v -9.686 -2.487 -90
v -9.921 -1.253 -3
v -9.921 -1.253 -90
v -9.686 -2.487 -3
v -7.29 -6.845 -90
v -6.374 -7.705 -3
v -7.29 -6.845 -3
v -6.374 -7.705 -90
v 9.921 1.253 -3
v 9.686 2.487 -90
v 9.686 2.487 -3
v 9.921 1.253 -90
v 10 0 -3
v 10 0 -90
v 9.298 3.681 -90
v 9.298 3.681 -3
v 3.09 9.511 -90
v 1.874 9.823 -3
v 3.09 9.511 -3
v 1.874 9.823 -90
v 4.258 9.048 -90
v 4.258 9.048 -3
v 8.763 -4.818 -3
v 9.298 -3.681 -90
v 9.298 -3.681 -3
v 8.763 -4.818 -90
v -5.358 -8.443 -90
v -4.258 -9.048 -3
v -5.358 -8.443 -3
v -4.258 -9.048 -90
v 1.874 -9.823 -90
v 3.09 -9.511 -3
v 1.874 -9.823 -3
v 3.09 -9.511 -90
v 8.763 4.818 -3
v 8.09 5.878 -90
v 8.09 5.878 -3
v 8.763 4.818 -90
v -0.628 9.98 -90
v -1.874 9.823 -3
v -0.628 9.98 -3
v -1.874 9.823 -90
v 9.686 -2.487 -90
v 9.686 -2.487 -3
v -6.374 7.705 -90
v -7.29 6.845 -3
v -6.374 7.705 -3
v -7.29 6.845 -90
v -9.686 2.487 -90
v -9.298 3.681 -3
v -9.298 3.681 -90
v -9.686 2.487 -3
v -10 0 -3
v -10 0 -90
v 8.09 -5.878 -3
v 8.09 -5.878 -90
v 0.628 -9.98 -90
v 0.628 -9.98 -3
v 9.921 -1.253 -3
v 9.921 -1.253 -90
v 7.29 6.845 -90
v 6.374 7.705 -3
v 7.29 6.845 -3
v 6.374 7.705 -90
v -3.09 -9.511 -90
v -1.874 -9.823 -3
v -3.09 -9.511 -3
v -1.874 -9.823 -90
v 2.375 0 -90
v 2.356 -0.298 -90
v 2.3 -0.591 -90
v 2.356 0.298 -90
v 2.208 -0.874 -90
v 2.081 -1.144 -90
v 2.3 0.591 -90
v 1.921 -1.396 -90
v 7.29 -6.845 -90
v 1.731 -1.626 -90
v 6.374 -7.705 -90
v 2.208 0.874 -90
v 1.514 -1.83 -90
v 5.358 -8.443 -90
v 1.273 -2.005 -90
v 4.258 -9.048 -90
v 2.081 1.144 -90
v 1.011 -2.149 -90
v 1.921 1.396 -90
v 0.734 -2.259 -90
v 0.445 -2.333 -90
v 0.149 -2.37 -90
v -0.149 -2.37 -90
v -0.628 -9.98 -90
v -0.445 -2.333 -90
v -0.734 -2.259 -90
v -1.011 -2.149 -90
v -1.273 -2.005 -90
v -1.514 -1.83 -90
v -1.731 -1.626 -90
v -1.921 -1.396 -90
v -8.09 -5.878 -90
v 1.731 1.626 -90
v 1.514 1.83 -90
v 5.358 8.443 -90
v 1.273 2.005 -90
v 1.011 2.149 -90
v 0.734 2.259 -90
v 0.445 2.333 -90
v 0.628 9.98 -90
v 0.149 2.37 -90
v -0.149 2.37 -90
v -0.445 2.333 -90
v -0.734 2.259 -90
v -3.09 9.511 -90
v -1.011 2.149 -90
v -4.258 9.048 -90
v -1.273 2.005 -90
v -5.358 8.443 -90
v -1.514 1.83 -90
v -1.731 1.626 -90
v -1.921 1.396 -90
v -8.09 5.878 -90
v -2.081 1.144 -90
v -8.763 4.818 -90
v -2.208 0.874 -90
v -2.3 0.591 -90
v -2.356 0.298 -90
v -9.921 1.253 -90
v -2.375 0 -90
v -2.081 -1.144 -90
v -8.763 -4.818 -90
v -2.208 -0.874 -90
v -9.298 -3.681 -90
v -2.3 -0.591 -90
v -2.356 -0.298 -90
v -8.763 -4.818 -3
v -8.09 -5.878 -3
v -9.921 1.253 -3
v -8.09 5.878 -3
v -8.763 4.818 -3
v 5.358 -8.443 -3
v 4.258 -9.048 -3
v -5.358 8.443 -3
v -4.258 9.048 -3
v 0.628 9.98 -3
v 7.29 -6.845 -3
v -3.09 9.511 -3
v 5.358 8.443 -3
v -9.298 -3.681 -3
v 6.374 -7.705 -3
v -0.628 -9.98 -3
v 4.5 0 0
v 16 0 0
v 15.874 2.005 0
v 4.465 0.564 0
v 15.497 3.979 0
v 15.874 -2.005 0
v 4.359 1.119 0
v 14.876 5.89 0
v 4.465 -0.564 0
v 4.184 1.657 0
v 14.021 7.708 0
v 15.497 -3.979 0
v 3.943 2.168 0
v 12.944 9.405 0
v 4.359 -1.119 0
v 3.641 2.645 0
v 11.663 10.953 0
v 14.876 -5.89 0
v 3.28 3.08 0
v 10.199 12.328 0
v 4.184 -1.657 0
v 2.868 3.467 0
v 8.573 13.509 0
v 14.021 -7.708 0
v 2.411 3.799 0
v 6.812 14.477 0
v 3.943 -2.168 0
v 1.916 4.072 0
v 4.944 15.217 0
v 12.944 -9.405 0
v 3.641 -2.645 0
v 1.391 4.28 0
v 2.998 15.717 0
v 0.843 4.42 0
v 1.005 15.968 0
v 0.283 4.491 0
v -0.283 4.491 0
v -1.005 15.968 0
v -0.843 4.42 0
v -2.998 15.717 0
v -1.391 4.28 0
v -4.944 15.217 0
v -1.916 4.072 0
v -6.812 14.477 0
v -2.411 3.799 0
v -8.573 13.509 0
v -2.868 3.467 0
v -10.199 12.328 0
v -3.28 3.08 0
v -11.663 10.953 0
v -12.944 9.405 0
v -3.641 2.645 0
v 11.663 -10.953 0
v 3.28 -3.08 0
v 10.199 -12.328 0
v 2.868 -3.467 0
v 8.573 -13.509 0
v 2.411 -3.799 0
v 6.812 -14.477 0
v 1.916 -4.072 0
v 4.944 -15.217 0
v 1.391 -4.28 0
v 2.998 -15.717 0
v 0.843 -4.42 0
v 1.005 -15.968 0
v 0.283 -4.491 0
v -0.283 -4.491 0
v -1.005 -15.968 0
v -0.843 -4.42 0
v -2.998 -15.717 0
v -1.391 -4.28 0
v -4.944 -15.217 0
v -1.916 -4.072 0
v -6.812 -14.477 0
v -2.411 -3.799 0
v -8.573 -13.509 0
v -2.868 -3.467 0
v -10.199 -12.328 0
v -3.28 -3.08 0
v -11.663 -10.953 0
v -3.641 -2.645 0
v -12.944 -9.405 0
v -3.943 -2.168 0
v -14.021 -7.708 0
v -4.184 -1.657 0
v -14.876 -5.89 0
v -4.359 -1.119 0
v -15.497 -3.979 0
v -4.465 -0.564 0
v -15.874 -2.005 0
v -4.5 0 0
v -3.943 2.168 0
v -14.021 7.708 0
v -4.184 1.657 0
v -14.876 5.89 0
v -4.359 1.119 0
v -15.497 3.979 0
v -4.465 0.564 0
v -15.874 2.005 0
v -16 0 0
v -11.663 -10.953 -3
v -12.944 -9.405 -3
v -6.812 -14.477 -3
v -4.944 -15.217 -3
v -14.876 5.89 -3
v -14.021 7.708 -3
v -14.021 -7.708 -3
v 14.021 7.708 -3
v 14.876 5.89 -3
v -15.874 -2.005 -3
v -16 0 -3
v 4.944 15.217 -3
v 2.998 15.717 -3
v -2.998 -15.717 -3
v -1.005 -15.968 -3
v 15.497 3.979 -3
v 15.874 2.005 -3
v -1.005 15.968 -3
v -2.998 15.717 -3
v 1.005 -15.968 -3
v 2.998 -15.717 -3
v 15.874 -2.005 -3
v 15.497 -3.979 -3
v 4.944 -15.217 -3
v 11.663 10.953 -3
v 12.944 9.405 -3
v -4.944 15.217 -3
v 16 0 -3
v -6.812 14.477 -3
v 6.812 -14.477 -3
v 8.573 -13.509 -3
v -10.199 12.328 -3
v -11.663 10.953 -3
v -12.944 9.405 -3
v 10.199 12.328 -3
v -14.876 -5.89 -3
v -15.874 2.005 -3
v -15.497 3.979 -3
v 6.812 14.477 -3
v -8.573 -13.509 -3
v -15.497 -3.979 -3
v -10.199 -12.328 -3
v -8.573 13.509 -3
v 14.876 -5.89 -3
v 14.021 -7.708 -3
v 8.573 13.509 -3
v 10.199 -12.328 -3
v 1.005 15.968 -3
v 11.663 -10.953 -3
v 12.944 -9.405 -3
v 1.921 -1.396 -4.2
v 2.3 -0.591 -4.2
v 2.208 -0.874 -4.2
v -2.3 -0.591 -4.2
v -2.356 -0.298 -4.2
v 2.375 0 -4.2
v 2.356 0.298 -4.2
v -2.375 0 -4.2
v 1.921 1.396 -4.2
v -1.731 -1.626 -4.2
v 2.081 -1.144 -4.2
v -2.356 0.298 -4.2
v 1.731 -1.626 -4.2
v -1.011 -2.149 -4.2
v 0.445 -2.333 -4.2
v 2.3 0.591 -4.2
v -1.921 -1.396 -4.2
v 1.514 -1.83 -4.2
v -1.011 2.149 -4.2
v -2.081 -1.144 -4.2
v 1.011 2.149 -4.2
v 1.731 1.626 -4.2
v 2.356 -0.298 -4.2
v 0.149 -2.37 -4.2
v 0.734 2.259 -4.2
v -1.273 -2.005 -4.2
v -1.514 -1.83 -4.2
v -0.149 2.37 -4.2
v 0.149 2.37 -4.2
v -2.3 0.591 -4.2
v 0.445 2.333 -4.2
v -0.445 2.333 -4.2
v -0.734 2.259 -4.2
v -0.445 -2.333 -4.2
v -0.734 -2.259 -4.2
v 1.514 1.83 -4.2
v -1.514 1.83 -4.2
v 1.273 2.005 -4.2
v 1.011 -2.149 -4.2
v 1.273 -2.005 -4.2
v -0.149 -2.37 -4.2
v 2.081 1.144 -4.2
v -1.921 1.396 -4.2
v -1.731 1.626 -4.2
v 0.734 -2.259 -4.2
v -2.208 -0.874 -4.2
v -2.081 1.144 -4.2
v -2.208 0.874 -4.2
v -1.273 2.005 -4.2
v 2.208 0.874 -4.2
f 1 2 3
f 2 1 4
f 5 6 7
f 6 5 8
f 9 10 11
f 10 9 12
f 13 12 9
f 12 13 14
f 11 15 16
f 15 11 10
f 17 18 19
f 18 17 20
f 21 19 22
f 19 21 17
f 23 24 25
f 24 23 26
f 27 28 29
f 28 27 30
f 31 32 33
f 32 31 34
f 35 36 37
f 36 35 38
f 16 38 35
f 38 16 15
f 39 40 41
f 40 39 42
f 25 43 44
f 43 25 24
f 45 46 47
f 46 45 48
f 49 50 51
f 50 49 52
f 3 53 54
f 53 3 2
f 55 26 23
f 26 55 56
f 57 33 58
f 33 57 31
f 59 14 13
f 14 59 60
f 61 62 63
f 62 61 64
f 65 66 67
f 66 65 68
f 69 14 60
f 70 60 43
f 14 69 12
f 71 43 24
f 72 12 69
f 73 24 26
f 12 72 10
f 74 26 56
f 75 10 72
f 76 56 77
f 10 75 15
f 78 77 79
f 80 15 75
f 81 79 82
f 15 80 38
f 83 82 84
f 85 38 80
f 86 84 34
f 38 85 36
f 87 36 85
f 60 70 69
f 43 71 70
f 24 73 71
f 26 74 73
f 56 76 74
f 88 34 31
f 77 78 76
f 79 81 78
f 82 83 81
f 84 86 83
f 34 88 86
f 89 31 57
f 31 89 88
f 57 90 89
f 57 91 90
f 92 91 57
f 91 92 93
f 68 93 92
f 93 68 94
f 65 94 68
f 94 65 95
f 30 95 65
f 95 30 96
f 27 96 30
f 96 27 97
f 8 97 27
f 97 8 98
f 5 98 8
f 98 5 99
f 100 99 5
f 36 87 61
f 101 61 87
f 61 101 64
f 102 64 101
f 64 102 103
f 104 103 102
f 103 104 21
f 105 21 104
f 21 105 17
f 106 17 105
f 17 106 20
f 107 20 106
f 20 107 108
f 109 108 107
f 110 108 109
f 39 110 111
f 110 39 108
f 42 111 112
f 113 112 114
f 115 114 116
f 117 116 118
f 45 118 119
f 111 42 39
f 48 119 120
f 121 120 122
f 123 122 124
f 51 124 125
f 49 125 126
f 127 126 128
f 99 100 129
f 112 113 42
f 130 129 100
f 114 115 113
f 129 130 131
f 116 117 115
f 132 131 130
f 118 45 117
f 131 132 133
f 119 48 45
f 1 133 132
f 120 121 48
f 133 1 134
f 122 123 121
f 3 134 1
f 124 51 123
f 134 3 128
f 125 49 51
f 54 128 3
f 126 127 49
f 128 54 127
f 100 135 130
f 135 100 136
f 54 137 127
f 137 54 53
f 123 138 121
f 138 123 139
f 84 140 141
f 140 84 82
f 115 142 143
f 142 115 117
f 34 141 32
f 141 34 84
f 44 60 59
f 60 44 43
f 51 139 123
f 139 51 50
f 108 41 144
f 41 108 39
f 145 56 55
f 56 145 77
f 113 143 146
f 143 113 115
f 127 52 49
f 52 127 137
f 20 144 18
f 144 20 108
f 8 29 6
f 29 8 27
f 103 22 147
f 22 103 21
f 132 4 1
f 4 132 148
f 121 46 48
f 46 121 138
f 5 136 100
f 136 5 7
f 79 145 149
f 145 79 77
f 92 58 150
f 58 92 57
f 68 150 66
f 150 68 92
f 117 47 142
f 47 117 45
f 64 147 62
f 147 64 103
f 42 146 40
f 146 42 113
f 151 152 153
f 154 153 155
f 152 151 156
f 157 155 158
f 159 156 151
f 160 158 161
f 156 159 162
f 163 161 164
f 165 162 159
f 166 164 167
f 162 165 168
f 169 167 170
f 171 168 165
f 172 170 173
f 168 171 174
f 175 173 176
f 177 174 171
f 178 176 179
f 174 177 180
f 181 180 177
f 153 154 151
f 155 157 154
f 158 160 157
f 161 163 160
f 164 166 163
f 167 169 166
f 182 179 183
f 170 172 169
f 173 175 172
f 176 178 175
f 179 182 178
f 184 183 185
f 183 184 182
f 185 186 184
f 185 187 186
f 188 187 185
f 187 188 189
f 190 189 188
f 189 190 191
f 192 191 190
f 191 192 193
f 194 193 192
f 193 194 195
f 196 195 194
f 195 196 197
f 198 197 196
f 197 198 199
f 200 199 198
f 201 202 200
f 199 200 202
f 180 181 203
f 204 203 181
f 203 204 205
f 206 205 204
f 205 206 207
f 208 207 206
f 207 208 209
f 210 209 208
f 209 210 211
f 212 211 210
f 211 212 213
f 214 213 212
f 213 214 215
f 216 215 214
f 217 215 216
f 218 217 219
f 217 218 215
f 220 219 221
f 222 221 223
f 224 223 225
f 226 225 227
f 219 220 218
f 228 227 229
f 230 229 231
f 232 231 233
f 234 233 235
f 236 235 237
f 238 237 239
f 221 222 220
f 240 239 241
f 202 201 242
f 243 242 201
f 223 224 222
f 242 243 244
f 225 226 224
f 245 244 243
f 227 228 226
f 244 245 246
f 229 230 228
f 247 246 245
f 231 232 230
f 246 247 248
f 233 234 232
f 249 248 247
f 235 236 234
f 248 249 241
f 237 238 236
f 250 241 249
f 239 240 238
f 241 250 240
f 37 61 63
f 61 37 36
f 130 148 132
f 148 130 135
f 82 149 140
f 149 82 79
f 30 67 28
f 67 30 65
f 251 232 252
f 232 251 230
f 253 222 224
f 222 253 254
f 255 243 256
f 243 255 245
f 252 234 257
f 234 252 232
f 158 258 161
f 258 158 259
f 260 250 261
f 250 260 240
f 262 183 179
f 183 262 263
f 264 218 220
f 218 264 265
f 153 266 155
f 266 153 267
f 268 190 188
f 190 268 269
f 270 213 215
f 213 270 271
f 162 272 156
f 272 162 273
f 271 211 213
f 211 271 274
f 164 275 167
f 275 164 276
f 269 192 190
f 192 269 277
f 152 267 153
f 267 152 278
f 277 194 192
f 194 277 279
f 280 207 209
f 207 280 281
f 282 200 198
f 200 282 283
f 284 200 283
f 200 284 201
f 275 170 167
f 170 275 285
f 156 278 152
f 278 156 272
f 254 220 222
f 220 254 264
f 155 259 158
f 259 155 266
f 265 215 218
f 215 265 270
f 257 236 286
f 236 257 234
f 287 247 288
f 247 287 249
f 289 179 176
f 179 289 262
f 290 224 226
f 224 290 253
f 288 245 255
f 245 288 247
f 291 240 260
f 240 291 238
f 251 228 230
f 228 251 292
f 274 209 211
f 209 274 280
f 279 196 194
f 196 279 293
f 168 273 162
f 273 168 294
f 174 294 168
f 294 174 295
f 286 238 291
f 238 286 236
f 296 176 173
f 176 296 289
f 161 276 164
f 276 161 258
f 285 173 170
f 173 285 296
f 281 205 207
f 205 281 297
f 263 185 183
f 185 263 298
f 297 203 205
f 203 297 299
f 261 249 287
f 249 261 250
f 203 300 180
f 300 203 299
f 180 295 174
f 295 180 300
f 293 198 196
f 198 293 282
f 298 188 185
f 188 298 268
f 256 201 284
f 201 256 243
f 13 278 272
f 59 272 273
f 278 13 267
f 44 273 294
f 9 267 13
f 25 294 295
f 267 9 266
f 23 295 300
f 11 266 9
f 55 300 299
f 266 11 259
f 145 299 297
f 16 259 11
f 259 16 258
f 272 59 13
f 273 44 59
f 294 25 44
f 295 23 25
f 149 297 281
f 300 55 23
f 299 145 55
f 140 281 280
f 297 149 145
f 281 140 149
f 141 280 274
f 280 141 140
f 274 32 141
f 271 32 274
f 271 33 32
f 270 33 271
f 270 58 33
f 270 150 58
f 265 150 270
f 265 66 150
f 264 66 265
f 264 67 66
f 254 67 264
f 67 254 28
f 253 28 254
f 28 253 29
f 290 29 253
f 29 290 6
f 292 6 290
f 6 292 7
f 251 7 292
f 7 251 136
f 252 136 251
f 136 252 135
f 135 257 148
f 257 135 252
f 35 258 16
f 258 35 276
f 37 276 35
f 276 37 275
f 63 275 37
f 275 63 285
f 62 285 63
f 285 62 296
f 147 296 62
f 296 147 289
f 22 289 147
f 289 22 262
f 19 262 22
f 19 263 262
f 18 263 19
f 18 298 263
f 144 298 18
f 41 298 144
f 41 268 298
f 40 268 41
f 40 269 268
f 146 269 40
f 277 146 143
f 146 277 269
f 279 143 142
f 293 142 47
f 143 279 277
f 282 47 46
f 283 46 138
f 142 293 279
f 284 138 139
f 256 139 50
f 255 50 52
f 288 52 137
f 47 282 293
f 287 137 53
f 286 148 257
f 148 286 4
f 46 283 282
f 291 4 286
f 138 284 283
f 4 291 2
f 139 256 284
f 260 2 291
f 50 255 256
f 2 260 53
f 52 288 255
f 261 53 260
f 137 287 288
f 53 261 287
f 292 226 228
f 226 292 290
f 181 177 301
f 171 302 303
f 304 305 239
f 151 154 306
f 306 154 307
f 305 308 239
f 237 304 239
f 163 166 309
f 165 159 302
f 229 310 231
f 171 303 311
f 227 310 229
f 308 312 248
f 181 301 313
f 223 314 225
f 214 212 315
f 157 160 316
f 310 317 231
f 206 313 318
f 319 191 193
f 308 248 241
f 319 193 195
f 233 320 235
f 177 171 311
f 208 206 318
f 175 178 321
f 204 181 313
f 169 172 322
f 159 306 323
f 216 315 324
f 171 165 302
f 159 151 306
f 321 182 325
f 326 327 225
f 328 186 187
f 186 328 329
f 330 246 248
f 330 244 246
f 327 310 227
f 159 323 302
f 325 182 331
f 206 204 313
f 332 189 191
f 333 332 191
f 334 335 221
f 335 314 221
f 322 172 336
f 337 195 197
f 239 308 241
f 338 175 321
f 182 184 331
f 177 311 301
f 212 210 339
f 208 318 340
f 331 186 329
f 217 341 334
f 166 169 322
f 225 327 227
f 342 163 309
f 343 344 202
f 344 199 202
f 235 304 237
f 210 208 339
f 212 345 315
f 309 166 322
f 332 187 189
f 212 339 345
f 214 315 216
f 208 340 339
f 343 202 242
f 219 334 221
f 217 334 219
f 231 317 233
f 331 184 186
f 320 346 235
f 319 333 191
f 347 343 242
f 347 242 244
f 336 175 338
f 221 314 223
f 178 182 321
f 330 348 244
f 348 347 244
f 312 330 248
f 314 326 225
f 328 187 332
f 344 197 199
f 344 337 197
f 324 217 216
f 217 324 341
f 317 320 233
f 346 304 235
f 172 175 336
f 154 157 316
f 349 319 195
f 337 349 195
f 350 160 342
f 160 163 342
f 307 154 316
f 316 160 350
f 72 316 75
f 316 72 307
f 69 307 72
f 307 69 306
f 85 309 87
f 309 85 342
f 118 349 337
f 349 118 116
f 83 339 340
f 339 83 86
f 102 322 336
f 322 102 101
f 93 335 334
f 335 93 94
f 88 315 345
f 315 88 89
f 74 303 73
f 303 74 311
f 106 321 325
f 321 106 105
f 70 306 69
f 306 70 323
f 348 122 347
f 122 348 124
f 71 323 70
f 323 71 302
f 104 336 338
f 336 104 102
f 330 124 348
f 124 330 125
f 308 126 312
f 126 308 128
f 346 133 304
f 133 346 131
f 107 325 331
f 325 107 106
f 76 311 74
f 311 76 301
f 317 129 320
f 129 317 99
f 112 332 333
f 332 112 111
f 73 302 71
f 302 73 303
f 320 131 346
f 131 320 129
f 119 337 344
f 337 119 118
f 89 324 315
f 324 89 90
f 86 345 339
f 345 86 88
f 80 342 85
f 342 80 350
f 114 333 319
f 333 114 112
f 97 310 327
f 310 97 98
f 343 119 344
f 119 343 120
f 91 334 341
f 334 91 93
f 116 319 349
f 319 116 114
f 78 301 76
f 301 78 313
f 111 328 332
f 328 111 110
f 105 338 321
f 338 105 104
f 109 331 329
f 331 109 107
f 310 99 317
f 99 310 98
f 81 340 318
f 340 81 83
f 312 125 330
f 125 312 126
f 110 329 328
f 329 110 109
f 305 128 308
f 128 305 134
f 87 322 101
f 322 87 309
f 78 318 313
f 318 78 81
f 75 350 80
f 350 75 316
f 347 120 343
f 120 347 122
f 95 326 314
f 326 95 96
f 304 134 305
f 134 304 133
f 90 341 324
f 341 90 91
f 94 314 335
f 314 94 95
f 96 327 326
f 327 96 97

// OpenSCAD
$fn = 50;


difference() {
	union() {
		translate(v = [0, 0, -90.0000000000]) {
			cylinder(h = 90, r = 10.0000000000);
		}
		translate(v = [0, 0, -3.0000000000]) {
			cylinder(h = 3, r = 16.0000000000);
		}
	}
	union() {
		translate(v = [0, 0, 0]) {
			rotate(a = [0, 0, 0]) {
				difference() {
					union() {
						#translate(v = [0, 0, -90.0000000000]) {
							cylinder(h = 90, r = 2.2500000000);
						}
						#translate(v = [0, 0, -4.2000000000]) {
							cylinder(h = 4.2000000000, r = 10.0000000000, r1 = 2.3750000000, r2 = 4.5000000000);
						}
						#translate(v = [0, 0, -90.0000000000]) {
							cylinder(h = 90, r = 2.3750000000);
						}
						#translate(v = [0, 0, -90.0000000000]) {
							cylinder(h = 90, r = 2.2500000000);
						}
					}
					union();
				}
			}
		}
	}
}
